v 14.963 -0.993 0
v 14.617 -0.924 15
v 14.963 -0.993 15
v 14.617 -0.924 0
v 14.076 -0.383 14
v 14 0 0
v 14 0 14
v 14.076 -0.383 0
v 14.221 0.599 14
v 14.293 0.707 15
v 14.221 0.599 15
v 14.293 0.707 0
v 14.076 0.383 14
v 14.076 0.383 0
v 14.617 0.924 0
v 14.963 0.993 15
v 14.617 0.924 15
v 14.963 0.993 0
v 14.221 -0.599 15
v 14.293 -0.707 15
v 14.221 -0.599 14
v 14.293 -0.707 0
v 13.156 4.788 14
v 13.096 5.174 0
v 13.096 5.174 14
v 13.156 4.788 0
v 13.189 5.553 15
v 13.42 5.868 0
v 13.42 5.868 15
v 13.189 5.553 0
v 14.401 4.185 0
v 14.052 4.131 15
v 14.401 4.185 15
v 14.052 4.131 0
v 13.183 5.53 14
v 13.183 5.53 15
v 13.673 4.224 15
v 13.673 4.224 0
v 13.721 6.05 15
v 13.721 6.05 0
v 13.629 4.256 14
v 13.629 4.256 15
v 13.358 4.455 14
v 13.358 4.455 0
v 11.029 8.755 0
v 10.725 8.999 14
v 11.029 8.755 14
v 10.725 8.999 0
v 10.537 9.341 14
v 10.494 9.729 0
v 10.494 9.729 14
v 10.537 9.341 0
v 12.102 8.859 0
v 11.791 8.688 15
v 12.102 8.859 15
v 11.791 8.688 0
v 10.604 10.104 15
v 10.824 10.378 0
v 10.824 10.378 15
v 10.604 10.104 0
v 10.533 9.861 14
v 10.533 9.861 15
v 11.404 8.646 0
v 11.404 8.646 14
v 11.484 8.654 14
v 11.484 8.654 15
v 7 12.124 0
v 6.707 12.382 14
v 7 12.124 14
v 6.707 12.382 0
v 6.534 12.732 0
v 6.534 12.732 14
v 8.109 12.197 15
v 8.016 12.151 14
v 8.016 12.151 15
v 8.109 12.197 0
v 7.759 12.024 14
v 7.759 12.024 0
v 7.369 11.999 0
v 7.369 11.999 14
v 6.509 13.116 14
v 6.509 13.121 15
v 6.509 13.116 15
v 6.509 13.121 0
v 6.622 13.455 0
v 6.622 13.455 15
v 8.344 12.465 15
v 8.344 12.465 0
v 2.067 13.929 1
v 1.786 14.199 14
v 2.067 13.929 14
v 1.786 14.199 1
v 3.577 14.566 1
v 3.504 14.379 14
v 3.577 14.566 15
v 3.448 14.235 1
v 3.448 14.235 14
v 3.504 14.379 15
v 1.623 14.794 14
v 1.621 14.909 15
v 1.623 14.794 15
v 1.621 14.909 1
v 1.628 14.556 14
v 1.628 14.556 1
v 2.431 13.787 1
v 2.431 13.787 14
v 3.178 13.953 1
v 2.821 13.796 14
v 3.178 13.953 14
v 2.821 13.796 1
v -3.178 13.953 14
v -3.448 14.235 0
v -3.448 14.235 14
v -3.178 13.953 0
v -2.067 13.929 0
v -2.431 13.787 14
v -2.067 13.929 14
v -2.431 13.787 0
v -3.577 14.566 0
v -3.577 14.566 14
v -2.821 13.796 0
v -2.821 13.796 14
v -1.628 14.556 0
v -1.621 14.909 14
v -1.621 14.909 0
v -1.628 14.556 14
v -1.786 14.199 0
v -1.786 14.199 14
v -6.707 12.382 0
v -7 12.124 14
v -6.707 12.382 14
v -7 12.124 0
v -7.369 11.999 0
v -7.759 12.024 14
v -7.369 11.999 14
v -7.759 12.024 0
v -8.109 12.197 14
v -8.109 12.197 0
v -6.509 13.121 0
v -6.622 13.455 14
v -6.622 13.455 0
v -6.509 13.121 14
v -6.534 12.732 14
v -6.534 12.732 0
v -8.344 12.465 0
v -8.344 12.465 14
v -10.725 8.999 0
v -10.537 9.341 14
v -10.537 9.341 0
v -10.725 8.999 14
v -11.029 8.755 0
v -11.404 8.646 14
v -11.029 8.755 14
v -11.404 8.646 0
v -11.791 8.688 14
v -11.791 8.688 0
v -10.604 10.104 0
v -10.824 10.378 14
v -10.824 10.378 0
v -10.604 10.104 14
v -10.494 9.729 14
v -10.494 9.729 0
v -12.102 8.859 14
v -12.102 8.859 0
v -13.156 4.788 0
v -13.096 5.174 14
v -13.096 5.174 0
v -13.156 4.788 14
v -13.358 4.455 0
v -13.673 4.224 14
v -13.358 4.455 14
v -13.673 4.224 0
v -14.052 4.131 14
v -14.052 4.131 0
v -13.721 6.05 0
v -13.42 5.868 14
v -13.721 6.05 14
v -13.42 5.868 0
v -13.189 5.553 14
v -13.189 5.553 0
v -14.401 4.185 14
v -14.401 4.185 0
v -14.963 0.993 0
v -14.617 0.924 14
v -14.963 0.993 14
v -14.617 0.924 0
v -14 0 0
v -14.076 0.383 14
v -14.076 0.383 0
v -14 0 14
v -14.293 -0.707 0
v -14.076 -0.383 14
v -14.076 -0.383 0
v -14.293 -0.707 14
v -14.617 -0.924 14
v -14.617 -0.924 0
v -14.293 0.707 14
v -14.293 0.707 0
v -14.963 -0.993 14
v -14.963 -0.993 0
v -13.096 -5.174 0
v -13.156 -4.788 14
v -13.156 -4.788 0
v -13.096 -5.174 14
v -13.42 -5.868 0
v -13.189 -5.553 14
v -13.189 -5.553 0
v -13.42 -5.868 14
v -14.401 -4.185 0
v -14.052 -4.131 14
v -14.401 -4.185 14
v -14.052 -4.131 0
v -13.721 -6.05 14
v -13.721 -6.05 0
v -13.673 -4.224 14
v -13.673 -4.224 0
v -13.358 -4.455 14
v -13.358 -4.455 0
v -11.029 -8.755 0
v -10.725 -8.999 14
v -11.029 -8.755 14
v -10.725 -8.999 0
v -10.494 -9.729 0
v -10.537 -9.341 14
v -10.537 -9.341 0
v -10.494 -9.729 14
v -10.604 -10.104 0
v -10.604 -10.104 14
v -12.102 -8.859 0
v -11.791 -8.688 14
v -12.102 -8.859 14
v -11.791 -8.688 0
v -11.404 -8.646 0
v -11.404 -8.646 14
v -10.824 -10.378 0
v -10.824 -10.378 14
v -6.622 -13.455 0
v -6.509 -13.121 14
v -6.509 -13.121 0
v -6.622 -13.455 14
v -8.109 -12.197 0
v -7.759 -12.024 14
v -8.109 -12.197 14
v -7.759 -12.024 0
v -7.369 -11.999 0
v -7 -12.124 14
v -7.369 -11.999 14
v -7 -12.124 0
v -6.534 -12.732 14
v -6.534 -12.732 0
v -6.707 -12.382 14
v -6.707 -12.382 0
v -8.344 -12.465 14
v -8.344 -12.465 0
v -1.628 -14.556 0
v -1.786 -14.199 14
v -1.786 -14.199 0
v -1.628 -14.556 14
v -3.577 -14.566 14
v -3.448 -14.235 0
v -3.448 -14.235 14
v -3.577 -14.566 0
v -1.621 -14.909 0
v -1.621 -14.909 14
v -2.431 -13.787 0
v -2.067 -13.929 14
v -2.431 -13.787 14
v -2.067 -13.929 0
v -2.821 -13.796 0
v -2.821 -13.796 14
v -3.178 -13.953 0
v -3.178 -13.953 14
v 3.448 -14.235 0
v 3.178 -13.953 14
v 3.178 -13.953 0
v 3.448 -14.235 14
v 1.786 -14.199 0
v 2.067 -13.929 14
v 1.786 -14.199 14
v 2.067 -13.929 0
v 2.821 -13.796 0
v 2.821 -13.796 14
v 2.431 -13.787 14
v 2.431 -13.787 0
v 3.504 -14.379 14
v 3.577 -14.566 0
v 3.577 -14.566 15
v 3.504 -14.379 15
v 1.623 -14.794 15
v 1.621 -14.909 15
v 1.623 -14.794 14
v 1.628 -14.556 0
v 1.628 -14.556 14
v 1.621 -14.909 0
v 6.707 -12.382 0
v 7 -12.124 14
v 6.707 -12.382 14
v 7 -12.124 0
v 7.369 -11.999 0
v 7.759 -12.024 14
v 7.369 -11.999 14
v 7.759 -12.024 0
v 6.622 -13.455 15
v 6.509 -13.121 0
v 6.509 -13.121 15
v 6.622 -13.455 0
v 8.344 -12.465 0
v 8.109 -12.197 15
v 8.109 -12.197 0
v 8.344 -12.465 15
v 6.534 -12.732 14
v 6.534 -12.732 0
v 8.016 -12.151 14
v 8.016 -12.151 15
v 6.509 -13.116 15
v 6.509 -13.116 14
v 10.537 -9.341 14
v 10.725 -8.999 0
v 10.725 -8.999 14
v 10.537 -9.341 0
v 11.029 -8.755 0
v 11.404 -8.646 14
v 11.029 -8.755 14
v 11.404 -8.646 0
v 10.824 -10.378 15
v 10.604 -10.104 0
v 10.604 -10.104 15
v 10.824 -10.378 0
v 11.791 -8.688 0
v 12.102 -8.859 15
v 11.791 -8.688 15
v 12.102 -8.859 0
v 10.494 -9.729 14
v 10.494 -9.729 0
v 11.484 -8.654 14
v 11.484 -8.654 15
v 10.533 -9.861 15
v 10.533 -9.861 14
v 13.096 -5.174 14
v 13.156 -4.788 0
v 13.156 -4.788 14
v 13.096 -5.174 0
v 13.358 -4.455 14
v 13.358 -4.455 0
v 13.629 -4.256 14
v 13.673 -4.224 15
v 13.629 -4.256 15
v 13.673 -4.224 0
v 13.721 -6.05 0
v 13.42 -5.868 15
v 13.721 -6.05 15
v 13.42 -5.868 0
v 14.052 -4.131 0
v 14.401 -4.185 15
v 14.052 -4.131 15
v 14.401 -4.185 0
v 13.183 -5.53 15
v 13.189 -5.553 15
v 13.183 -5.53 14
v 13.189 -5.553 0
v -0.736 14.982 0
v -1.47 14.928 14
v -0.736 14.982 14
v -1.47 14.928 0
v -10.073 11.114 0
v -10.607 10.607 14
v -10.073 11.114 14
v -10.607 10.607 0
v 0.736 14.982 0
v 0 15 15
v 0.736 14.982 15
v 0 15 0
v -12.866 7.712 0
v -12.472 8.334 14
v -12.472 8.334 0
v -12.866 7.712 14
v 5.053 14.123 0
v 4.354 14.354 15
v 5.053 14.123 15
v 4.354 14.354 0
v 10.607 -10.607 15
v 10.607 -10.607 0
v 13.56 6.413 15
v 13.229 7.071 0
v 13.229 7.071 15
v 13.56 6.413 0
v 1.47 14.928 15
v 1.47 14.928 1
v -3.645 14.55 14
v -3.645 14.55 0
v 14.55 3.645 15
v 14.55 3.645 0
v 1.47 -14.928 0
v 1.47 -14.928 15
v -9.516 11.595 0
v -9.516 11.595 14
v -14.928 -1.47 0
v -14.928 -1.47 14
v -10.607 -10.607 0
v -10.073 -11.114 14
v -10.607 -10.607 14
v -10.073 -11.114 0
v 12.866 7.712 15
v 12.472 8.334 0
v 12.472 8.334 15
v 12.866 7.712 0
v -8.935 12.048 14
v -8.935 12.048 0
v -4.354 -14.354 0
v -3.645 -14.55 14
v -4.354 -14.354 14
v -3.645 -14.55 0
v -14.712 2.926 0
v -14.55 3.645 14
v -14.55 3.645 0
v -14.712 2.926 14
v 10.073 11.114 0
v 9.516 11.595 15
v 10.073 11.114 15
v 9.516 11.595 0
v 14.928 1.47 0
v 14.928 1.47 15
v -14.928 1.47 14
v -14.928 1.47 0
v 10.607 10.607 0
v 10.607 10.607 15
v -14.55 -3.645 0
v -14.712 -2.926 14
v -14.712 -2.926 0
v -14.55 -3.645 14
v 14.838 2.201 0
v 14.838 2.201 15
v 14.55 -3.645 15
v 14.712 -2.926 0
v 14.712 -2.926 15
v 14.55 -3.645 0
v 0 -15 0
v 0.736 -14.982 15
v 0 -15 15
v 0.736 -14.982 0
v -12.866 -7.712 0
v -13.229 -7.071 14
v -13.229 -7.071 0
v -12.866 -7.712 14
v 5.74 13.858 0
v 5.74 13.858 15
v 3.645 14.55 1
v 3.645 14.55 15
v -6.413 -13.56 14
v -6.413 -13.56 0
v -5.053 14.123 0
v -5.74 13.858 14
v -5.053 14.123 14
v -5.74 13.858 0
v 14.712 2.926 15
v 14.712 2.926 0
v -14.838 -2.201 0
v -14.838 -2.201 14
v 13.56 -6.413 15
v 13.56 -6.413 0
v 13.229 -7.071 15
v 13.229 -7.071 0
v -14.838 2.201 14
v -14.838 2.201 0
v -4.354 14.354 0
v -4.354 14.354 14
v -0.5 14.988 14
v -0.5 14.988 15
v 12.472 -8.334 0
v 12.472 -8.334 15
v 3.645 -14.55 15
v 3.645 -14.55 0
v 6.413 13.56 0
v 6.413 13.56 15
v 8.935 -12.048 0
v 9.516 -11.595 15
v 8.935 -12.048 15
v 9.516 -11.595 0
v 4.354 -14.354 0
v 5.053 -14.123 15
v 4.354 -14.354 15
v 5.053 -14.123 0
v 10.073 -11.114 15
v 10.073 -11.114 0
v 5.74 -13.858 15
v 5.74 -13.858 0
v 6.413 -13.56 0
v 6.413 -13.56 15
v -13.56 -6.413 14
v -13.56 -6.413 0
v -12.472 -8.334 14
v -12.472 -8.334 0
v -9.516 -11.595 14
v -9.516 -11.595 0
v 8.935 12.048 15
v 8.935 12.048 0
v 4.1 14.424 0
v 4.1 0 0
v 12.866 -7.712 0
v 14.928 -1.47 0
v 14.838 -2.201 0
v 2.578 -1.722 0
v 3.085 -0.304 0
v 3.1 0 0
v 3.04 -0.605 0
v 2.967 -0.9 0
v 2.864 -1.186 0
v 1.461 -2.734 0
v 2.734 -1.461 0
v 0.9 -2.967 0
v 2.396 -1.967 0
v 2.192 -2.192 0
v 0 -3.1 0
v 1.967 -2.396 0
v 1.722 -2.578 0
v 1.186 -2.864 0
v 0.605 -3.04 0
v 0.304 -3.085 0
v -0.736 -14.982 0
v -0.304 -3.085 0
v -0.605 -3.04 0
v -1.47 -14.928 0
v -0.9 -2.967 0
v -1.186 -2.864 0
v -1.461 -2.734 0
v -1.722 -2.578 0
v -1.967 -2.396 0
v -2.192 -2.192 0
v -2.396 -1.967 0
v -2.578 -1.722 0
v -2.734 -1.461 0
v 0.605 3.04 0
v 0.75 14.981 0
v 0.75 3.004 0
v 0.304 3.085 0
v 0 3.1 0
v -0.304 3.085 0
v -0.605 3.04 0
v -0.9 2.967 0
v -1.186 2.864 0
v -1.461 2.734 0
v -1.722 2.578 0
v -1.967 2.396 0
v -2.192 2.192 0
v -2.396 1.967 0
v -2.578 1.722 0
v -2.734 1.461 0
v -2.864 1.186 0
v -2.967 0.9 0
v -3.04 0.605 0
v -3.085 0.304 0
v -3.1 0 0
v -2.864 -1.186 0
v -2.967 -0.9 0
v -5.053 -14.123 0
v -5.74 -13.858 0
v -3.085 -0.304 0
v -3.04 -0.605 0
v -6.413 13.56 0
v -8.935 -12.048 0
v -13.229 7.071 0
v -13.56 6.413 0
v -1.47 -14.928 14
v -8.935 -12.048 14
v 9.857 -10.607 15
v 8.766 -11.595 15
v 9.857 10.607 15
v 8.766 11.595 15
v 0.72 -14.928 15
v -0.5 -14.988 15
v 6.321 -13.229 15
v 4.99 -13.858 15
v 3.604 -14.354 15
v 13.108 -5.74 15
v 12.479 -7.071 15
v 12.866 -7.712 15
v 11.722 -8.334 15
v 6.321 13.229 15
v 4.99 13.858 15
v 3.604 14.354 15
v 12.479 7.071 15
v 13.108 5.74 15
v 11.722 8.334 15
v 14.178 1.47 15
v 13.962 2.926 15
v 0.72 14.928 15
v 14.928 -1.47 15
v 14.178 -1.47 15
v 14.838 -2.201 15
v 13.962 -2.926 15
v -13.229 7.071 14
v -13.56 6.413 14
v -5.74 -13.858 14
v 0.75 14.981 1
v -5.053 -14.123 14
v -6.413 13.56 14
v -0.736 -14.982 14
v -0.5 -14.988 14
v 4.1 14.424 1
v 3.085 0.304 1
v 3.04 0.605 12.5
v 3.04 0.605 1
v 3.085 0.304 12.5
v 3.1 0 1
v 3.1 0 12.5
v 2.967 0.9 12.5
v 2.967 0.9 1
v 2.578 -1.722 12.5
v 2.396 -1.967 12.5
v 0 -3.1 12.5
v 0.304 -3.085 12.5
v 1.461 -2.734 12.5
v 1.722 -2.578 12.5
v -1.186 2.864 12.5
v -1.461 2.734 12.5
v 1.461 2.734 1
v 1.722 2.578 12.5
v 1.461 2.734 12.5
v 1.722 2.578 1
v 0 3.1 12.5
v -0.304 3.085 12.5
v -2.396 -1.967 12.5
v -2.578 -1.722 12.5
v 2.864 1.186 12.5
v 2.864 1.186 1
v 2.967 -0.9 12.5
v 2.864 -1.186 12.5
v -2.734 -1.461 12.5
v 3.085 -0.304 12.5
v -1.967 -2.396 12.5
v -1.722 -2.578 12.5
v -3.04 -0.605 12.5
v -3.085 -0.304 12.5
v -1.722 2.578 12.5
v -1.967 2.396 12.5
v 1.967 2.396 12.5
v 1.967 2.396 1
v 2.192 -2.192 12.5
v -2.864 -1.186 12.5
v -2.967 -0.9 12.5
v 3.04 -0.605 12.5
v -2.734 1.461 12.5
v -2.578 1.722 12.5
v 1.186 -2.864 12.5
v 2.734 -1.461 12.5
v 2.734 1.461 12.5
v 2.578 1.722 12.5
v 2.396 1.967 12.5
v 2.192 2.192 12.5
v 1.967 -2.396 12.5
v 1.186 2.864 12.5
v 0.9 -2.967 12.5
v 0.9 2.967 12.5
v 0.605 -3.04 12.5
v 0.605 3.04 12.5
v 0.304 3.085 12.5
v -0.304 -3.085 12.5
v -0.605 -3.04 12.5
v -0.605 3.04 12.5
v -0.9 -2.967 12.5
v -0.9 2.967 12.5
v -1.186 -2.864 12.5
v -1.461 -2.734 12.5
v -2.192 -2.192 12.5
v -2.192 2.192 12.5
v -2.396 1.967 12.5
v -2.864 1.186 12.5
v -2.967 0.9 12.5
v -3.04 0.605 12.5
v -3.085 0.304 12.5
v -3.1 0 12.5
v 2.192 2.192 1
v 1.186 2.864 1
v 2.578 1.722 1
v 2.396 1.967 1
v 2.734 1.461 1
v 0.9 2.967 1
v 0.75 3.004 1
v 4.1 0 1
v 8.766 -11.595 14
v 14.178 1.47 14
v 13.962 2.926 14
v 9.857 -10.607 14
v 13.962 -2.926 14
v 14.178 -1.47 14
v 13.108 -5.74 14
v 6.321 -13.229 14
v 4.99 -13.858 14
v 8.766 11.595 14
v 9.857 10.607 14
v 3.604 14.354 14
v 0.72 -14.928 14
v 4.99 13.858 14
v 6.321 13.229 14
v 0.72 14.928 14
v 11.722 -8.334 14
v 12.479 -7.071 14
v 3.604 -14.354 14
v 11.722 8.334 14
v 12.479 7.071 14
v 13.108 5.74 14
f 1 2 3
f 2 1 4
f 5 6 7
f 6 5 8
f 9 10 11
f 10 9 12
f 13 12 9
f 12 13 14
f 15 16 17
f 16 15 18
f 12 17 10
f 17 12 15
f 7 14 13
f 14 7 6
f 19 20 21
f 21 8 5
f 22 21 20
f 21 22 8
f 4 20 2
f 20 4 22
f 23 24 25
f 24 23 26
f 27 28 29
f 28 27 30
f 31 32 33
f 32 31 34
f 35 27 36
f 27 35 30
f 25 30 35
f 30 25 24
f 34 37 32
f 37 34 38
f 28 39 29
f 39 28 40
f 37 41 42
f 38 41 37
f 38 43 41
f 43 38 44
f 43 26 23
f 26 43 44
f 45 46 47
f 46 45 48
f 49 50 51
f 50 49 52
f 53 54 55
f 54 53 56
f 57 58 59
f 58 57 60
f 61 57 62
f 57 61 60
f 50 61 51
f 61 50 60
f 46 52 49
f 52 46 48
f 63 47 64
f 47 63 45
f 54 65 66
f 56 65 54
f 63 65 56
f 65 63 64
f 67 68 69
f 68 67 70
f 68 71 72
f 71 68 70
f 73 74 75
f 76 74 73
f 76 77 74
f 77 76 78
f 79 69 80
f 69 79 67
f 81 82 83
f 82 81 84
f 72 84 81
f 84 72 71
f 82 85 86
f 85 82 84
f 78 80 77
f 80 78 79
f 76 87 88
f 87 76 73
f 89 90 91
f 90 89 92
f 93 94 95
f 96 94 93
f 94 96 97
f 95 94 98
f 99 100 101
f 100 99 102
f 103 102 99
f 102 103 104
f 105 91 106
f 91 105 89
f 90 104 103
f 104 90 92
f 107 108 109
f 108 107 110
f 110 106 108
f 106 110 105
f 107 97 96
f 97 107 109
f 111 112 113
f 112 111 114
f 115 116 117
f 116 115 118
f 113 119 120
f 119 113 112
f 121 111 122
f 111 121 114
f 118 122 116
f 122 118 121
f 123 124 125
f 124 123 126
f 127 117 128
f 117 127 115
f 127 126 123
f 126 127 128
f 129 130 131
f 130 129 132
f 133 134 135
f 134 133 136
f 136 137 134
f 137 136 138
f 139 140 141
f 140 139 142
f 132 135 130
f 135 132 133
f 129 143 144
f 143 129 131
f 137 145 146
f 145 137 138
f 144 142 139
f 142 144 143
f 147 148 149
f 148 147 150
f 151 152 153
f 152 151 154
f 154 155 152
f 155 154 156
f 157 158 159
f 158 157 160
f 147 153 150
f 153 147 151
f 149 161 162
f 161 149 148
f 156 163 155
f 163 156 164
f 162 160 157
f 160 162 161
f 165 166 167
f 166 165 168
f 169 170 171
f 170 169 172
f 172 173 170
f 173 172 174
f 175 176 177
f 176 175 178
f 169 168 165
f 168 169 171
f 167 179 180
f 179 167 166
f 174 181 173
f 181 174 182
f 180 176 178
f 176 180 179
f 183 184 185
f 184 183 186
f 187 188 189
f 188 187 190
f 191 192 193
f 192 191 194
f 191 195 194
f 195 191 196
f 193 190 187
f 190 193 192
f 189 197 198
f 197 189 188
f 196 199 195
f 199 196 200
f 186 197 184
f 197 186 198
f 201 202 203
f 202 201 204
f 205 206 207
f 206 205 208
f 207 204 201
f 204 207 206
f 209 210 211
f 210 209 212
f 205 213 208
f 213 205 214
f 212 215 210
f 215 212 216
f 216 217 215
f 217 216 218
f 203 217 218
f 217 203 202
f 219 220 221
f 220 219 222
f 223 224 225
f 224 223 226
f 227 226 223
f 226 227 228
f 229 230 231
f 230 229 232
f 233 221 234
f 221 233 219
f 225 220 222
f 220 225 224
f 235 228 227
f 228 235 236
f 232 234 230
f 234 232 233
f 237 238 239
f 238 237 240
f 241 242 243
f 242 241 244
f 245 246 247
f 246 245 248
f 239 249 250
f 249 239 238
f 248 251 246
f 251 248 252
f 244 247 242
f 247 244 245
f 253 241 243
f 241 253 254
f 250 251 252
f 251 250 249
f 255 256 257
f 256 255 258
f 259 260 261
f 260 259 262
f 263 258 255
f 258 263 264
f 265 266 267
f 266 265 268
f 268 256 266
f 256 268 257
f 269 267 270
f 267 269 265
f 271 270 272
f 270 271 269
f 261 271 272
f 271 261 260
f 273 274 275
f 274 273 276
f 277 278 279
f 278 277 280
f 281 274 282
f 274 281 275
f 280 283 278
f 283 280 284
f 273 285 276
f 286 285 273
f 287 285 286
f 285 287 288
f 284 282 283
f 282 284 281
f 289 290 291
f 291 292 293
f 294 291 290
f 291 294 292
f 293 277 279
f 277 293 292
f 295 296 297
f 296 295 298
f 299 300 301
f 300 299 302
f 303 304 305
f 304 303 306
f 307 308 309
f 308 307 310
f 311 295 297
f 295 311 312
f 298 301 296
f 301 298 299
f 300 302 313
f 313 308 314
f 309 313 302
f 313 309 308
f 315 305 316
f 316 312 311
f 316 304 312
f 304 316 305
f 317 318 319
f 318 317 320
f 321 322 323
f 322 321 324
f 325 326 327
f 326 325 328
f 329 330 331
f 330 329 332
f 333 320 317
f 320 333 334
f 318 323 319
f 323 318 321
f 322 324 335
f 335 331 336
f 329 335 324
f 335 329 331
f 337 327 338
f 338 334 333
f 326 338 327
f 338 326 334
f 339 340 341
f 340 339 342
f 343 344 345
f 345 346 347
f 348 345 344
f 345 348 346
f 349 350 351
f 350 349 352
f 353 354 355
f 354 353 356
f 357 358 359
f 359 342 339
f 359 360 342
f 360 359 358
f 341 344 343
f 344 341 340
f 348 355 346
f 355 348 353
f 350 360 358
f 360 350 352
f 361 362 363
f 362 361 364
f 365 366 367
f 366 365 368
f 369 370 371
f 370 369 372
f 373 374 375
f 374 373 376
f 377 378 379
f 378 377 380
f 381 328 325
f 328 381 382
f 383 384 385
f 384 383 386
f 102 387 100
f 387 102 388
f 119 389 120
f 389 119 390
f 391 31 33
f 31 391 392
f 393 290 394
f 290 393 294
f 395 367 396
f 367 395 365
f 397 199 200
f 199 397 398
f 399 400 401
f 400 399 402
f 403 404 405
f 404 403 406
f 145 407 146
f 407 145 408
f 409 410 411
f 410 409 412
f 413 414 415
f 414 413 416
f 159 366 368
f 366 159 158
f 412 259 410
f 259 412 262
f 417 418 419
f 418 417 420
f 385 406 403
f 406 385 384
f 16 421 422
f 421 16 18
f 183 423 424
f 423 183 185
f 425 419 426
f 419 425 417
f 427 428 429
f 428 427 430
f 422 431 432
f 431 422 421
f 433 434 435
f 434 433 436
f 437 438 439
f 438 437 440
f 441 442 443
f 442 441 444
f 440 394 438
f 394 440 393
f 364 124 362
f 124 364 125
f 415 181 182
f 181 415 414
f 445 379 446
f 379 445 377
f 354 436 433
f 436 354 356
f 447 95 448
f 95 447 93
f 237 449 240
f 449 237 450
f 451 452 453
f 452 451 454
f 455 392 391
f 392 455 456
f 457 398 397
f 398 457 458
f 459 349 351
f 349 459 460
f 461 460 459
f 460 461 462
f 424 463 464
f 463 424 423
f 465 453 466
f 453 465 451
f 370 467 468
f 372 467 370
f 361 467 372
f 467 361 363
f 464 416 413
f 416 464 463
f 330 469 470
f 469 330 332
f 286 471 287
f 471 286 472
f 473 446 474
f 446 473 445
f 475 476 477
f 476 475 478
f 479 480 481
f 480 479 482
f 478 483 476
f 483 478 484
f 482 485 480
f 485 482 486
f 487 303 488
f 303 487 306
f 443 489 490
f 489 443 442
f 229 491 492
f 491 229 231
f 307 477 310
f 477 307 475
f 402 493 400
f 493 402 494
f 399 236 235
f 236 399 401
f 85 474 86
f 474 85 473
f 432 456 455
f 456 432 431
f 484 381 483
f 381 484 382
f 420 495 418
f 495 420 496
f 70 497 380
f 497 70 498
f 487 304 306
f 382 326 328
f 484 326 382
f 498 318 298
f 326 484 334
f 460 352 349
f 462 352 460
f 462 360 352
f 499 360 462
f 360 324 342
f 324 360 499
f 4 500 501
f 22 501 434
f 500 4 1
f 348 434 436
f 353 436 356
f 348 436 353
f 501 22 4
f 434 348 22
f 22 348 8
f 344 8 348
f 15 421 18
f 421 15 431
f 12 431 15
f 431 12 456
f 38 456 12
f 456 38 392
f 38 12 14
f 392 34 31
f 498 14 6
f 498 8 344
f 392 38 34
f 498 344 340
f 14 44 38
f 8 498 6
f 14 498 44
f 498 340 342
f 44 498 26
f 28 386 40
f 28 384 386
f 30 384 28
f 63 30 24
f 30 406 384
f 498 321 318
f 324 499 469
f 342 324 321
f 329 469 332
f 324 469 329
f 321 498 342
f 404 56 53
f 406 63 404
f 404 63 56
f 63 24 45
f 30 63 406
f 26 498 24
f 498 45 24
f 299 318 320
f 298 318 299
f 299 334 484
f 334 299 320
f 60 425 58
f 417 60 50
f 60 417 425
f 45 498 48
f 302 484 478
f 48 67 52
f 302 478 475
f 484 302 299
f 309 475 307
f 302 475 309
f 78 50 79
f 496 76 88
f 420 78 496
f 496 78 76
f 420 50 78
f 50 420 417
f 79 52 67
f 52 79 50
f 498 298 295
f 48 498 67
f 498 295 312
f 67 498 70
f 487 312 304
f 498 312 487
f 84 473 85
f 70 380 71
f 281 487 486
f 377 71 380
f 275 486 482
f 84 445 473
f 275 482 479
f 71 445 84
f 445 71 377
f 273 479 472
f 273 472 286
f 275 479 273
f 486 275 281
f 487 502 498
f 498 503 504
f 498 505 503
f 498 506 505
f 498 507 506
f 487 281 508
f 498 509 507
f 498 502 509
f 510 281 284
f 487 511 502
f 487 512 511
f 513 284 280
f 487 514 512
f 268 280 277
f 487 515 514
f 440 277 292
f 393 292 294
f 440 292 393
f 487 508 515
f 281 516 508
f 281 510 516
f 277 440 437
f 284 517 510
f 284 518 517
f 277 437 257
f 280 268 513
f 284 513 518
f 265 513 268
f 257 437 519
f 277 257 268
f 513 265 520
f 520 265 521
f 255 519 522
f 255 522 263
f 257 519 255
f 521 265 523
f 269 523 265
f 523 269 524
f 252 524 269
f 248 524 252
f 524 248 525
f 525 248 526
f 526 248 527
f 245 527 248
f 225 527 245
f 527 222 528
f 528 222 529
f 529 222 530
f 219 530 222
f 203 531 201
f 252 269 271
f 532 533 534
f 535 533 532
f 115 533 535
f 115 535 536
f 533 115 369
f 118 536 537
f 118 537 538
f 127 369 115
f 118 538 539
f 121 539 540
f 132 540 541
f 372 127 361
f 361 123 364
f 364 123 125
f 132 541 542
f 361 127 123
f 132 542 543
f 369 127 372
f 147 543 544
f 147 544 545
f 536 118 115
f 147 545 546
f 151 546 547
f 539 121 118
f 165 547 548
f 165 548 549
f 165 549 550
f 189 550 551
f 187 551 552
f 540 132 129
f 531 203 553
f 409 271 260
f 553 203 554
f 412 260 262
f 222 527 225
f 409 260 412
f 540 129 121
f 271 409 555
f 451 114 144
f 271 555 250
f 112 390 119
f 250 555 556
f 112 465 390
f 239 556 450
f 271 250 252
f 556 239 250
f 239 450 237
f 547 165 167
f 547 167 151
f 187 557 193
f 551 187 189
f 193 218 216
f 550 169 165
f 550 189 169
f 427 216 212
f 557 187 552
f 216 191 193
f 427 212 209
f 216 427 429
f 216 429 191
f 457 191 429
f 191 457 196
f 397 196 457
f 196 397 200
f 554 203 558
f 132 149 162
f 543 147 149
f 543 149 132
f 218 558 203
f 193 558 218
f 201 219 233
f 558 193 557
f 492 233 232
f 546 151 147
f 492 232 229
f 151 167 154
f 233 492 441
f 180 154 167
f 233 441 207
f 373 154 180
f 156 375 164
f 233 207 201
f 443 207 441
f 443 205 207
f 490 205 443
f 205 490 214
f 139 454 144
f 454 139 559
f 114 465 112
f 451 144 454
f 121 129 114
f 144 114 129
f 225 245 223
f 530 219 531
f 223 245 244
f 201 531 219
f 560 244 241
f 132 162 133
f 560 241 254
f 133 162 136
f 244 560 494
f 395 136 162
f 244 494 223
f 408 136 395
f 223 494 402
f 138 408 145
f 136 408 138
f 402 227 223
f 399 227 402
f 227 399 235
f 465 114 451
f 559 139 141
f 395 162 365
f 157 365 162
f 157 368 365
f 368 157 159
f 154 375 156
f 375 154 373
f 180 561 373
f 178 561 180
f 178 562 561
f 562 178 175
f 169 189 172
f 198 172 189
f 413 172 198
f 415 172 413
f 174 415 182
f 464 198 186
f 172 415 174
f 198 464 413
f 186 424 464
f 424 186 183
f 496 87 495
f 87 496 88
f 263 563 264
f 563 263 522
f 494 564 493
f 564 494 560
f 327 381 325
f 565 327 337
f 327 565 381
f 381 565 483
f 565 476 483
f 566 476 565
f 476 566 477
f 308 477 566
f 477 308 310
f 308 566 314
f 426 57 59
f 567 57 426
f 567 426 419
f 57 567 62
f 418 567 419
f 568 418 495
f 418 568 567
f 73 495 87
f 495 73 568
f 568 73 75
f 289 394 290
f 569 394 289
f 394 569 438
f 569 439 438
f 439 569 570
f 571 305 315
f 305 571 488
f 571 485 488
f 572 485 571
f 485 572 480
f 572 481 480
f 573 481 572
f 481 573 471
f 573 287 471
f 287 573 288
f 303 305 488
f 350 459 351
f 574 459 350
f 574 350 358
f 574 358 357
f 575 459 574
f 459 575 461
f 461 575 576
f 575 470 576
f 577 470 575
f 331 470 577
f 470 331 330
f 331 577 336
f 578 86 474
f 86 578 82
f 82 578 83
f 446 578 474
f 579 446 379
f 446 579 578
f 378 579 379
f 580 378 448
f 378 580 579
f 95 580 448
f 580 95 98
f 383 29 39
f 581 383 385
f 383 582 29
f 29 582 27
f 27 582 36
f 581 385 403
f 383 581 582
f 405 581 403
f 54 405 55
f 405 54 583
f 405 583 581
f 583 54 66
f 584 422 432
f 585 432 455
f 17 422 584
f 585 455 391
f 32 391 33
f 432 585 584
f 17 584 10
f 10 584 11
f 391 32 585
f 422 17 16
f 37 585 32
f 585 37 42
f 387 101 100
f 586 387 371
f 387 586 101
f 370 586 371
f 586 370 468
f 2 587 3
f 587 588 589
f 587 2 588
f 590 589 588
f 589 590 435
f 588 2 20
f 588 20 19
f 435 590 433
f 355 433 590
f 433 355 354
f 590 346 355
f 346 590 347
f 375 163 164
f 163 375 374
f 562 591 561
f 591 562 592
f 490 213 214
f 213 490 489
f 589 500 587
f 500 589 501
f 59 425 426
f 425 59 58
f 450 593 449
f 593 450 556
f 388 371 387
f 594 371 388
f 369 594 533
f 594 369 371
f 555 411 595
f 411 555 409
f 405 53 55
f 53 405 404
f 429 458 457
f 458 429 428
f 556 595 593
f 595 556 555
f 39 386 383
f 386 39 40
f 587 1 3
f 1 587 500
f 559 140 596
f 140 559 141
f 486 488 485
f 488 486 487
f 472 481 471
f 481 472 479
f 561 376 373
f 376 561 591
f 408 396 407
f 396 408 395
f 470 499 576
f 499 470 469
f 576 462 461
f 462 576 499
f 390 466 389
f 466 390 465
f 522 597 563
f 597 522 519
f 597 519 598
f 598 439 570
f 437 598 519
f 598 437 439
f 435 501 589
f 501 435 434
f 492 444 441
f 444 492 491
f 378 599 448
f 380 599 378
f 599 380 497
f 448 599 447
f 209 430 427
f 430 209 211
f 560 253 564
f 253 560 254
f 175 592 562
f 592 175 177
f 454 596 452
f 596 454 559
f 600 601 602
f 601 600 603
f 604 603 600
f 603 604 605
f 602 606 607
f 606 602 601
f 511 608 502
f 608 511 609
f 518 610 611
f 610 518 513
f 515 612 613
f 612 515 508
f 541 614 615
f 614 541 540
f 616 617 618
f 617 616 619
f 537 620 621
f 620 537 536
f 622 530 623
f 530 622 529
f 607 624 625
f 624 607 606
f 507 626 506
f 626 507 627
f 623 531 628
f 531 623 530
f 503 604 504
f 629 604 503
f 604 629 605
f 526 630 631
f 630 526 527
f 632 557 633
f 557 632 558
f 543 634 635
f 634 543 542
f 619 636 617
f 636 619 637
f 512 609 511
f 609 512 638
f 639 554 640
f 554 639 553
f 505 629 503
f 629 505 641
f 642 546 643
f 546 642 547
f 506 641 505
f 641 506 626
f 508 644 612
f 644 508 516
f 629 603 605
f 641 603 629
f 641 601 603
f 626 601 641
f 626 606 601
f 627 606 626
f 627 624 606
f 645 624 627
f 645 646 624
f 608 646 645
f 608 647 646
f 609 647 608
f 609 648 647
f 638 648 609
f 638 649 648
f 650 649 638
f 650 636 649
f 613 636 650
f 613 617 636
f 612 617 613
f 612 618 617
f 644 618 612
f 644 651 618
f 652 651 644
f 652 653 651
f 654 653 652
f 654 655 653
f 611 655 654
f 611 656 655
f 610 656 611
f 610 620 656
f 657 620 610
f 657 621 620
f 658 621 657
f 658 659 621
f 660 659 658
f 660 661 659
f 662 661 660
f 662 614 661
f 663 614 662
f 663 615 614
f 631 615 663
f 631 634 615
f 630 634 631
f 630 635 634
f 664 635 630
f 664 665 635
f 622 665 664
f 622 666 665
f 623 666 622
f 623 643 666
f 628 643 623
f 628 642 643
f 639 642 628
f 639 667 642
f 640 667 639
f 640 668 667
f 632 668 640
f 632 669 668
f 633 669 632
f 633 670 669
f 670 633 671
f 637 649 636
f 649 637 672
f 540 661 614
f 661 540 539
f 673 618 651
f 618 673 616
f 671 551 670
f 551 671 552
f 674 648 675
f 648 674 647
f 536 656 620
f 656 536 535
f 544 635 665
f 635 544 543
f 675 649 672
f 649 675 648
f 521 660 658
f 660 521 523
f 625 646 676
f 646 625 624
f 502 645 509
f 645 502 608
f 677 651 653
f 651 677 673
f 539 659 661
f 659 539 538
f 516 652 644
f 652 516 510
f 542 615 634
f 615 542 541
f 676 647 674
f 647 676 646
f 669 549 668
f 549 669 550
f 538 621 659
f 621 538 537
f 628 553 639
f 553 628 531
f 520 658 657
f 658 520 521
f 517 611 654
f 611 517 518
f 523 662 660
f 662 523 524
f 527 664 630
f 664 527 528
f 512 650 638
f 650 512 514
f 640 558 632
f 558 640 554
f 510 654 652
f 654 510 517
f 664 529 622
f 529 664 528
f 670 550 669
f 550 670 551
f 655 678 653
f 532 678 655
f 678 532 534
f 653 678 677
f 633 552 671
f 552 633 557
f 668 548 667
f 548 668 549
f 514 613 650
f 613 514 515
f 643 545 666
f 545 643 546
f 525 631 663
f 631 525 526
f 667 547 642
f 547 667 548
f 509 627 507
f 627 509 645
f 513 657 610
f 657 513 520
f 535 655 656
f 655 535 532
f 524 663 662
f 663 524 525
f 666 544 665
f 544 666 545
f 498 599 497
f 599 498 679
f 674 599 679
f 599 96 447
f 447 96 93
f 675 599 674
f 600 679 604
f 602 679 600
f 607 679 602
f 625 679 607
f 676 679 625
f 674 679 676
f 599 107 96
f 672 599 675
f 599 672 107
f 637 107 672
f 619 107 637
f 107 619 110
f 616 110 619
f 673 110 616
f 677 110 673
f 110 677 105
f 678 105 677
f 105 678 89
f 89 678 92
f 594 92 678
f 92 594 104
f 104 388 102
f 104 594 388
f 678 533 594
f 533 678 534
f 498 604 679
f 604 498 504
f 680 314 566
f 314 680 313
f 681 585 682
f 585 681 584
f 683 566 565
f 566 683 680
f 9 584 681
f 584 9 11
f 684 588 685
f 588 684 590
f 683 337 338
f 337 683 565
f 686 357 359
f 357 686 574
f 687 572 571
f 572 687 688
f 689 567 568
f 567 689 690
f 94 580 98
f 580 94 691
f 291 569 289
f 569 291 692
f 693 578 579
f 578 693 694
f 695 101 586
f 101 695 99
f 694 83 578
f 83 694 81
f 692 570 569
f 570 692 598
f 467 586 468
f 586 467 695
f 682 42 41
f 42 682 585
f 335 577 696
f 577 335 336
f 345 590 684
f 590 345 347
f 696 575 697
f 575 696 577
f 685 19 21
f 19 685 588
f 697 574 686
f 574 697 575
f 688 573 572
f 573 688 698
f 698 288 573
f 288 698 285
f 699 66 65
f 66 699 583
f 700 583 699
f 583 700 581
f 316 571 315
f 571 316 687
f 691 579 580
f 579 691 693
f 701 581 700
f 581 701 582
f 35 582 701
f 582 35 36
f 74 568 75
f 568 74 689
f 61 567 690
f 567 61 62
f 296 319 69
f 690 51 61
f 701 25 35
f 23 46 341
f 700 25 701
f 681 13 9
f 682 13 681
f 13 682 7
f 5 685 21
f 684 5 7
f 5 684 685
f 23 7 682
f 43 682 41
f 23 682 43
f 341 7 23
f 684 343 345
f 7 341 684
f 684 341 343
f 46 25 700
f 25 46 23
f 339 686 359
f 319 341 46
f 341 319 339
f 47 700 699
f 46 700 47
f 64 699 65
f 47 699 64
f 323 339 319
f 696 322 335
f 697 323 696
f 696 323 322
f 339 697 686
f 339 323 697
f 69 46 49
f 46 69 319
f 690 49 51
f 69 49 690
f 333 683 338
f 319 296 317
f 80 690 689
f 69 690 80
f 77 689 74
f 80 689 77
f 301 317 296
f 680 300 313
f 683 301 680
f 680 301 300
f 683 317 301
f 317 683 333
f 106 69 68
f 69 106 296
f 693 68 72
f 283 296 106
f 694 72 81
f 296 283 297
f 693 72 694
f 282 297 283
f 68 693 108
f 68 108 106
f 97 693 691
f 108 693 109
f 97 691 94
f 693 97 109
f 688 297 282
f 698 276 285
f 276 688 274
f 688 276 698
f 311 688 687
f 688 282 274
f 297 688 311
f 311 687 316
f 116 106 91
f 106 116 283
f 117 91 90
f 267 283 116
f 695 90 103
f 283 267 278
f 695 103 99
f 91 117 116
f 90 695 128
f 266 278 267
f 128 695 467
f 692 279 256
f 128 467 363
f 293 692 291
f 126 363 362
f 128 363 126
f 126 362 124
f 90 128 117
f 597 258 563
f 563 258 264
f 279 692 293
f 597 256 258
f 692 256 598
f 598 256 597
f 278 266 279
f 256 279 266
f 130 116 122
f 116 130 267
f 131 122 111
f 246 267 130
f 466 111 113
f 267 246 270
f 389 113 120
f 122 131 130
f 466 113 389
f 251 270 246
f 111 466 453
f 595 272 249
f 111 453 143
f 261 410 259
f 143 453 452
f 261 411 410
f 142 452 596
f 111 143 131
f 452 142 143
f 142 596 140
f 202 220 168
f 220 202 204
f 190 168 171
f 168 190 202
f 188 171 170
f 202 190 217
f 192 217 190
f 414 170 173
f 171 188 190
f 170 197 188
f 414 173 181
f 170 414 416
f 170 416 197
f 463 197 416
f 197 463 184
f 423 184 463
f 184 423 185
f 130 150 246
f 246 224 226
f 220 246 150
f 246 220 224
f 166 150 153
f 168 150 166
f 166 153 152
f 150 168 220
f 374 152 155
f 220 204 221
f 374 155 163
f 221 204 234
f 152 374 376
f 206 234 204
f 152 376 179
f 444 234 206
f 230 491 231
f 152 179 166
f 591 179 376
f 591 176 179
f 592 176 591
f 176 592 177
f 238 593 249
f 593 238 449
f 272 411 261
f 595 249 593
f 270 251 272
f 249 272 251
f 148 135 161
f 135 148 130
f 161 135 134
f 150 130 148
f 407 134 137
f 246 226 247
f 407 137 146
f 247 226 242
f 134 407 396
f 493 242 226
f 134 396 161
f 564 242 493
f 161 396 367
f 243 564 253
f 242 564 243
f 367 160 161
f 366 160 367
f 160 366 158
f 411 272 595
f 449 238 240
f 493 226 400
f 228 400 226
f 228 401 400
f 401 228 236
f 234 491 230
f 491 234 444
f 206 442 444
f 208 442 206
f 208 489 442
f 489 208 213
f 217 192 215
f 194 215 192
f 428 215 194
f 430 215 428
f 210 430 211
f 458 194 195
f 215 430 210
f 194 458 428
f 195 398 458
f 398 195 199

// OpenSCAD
// Replacement knob for a hotplate stirrer with a 6 mm D-shaft
// Print orientation: bottom face (facing the hotplate) on the bed at z = 0

// ---------------- Parameters ----------------
knob_d      = 30;    // knob outer diameter (mm)
knob_h      = 15;    // knob height (mm)

bore_depth  = 12;    // D-bore depth from bottom face (mm)
bore_w      = 4.7;   // D-bore width: flat to opposite side of circle (mm)
bore_d      = 6.2;   // diameter of the circle the D-bore is based on (mm)

groove_n    = 18;    // number of vertical grip grooves
groove_d    = 2;     // grip groove diameter (mm)

pointer_w   = 1.5;   // pointer groove width (mm)
pointer_d   = 1;     // pointer groove depth (mm)

eps         = 0.5;   // overcut so cutting shapes pass beyond faces (mm)

$fn = 128;           // resolution for curved surfaces

// ---------------- Derived ----------------
// D-bore geometry: circle of diameter bore_d with one side cut flat.
// The distance from the flat to the circle centre is (bore_d - bore_w)/2.
bore_offset = (bore_d - bore_w) / 2;   // distance from flat to circle centre

// ---------------- Model ----------------
difference() {
    // Main body: cylinder, centred in X/Y, sitting on z = 0
    cylinder(d = knob_d, h = knob_h);

    // D-shaped blind bore from the bottom face, running up to bore_depth
    translate([0, 0, -eps])
        cylinder(r = bore_d / 2, h = bore_depth + 2 * eps, $fn = 64);
    // Remove the flat side of the D (extends past the top of the bore)
    translate([bore_offset, 0, -eps])
        cube([bore_w / 2 + 2 * eps, knob_h + 2 * eps, 2 * bore_offset]);

    // 18 evenly spaced vertical grip grooves along the full height
    for (i = [0 : groove_n - 1])
        rotate([0, 0, i * 360 / groove_n])
            translate([knob_d / 2, 0, -eps])
                cylinder(d = groove_d, h = knob_h + 2 * eps, $fn = 16);

    // Pointer groove on the top face, from the centre to the outer edge,
    // on the same side as the flat of the D
    translate([-bore_offset, 0, knob_h - pointer_d])
        linear_extrude(height = pointer_w)
            circle(r = knob_d / 2, $fn = 64);
}
